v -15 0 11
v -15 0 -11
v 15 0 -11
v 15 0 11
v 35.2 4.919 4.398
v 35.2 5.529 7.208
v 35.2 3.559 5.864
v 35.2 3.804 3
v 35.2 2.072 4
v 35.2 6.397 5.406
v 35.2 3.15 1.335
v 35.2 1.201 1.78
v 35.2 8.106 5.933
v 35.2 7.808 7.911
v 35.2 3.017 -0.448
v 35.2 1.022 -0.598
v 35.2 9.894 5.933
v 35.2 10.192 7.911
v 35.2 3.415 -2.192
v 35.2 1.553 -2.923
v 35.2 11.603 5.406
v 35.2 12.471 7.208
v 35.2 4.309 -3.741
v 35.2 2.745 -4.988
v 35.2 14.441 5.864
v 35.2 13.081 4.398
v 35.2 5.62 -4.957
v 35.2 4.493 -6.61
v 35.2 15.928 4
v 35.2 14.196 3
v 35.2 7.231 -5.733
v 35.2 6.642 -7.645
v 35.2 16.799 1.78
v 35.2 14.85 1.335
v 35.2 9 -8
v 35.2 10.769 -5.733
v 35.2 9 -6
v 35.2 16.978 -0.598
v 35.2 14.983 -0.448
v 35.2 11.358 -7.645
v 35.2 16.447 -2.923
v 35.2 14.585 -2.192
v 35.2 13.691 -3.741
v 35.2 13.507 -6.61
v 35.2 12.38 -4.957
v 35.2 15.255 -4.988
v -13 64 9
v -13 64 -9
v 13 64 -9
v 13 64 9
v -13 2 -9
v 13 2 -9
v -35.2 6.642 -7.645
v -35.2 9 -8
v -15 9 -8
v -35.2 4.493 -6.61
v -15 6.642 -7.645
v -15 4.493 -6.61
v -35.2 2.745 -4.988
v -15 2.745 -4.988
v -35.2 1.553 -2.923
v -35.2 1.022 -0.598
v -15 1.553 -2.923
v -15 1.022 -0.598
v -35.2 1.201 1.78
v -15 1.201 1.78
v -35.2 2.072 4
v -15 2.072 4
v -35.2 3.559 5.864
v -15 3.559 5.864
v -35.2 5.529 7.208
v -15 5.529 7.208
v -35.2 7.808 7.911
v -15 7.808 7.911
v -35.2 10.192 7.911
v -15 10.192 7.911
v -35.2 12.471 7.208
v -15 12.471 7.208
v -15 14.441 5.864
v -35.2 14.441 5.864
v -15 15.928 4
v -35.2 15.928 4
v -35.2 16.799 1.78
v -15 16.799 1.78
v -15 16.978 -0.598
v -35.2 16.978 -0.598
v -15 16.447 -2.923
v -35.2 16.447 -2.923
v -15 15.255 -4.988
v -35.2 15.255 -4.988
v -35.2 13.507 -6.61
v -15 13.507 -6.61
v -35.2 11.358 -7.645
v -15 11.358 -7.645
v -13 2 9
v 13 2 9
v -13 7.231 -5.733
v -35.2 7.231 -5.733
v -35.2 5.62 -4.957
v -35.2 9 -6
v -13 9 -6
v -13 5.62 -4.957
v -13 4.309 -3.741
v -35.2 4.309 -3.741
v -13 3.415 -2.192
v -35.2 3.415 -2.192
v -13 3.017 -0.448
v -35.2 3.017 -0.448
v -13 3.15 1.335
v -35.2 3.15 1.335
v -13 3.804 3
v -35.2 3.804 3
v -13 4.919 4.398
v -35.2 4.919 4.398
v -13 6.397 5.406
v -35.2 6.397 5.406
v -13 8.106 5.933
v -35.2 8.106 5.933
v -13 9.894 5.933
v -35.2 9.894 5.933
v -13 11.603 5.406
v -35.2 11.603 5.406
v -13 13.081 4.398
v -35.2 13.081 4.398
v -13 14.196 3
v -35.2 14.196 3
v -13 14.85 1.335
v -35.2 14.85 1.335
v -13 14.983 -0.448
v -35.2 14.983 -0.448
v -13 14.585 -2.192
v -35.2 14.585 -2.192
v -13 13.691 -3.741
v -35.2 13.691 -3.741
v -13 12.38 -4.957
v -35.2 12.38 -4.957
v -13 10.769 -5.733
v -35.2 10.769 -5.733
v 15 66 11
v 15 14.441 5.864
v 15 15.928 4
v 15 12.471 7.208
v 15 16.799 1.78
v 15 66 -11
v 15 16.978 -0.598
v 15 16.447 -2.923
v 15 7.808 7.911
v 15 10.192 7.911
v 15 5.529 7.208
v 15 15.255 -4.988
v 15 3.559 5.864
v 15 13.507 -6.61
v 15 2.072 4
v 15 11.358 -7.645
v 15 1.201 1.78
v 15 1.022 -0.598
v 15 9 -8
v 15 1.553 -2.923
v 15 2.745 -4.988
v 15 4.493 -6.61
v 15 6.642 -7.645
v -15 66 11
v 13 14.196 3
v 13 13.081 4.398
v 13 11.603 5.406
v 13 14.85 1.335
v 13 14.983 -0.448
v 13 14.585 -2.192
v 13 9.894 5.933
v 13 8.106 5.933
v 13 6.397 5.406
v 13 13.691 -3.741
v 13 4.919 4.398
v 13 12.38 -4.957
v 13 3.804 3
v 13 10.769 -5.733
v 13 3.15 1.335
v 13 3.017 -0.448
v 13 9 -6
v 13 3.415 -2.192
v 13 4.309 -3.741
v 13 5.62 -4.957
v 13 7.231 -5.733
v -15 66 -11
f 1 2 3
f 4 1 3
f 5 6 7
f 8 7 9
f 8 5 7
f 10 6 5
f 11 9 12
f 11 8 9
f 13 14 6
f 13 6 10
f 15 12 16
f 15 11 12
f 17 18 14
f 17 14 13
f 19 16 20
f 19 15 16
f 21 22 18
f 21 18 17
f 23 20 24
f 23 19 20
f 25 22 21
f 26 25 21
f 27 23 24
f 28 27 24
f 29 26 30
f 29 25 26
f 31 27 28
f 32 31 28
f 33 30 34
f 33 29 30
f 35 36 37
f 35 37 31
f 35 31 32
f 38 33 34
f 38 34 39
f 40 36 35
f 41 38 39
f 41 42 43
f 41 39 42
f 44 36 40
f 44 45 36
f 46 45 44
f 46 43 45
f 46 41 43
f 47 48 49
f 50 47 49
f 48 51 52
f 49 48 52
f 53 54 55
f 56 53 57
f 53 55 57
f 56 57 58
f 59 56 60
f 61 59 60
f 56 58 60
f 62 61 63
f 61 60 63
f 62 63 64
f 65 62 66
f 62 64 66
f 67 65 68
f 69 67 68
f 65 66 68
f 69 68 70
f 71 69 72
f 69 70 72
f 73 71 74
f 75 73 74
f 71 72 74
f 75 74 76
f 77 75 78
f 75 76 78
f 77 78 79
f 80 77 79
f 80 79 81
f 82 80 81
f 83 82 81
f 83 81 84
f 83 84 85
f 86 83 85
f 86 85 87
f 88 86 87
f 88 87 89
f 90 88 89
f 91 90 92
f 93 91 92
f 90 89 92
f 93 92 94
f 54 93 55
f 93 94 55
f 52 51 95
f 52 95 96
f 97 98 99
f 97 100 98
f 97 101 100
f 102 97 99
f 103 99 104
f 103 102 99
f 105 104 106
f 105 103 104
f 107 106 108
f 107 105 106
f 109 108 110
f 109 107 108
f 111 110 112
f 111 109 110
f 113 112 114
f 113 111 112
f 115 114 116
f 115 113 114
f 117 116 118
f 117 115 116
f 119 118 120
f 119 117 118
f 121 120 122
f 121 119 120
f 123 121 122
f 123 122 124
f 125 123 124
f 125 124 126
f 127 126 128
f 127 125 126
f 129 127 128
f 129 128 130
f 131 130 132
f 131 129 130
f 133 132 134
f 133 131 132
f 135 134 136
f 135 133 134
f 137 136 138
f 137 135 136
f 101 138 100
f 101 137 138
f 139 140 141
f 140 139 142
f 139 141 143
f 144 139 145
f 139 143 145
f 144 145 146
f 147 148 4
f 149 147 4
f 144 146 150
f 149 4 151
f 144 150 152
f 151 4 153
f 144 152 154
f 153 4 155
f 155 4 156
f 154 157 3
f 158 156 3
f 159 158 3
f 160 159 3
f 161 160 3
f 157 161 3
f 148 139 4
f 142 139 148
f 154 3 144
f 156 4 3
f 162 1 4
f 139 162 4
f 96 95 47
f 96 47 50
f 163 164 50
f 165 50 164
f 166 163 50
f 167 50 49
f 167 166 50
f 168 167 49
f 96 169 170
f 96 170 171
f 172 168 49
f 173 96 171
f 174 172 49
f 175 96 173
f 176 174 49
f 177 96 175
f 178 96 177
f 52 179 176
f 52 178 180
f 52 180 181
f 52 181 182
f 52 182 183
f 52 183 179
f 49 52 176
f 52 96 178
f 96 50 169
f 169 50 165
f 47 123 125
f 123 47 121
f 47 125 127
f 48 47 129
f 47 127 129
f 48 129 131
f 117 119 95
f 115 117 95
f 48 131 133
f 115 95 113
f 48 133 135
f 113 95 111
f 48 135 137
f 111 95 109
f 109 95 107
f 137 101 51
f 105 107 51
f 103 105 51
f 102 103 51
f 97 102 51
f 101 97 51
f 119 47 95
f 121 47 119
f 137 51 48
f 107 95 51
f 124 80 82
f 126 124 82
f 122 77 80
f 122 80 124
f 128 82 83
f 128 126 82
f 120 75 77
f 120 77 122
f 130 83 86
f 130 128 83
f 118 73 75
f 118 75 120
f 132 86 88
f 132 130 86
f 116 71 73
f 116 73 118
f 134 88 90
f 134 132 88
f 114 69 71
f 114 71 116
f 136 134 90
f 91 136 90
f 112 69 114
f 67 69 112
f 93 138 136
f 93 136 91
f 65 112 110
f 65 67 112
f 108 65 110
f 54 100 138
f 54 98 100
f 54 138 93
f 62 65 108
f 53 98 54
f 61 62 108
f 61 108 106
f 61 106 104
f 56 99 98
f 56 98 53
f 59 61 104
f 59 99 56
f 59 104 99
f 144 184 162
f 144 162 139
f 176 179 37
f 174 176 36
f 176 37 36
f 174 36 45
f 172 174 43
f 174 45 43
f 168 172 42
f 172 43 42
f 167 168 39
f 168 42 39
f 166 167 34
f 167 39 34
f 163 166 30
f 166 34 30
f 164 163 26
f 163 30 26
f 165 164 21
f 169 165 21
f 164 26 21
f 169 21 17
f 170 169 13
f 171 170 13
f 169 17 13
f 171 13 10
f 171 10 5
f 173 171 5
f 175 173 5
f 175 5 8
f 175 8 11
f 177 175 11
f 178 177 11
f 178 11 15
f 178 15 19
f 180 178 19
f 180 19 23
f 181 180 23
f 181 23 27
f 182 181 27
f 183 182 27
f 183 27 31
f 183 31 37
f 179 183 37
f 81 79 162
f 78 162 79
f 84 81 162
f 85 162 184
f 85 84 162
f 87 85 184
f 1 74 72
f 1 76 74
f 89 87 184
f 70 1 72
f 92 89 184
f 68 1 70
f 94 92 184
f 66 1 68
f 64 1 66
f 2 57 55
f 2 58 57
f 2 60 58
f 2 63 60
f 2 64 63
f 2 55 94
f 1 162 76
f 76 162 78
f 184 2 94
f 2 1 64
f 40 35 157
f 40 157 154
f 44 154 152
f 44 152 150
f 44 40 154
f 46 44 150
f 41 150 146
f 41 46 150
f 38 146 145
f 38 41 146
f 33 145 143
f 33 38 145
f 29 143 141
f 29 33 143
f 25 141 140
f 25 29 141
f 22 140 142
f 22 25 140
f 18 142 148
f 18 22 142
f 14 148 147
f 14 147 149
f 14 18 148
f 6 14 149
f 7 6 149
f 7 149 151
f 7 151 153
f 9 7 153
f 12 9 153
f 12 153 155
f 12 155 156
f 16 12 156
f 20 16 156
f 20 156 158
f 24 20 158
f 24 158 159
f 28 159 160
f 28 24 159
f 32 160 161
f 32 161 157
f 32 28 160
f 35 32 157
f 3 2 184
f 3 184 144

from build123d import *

# Parameters (mm, degrees)
SKETCH1_W           = 30
SKETCH1_H           = 22
BOSS_EXTRUDE1_DEPTH = 66
SKETCH2_R           = 8
BOSS_EXTRUDE2_DEPTH = 20.2
BOSS_EXTRUDE3_START = 20.2
SKETCH3_R           = 8
BOSS_EXTRUDE3_DEPTH = 20.2
SHELL1_T            = -2


with BuildPart() as part:
    # Sketch1 → Boss-Extrude1 (new body)
    with BuildSketch(Plane(origin=(0, 0, 0), x_dir=(1, 0, 0), z_dir=(0, 1, 0))):
        Rectangle(SKETCH1_W, SKETCH1_H)
    extrude(amount=BOSS_EXTRUDE1_DEPTH)

    # Sketch2 → Boss-Extrude2 (add)
    with BuildSketch(Plane.ZY.offset(15)):
        with Locations(Location((0, 9, 0), (0, 0, 180))):
            Circle(SKETCH2_R)
    extrude(amount=BOSS_EXTRUDE2_DEPTH)

    # Sketch3 → Boss-Extrude3 (add)
    with BuildSketch(Plane(origin=(15, 0, 0), x_dir=(0, 0, -1), z_dir=(1, 0, 0)).offset(BOSS_EXTRUDE3_START)):
        with Locations((0, 9)):
            Circle(SKETCH3_R)
    extrude(amount=-BOSS_EXTRUDE3_DEPTH)

    # Shell1
    shell1_openings = [part.faces().sort_by_distance(p)[0] for p in [
        (-35.2, 9, 0),
        (35.2, 9, 0),
    ]]
    offset(amount=SHELL1_T, openings=shell1_openings, kind=Kind.INTERSECTION)


solid = part.part
